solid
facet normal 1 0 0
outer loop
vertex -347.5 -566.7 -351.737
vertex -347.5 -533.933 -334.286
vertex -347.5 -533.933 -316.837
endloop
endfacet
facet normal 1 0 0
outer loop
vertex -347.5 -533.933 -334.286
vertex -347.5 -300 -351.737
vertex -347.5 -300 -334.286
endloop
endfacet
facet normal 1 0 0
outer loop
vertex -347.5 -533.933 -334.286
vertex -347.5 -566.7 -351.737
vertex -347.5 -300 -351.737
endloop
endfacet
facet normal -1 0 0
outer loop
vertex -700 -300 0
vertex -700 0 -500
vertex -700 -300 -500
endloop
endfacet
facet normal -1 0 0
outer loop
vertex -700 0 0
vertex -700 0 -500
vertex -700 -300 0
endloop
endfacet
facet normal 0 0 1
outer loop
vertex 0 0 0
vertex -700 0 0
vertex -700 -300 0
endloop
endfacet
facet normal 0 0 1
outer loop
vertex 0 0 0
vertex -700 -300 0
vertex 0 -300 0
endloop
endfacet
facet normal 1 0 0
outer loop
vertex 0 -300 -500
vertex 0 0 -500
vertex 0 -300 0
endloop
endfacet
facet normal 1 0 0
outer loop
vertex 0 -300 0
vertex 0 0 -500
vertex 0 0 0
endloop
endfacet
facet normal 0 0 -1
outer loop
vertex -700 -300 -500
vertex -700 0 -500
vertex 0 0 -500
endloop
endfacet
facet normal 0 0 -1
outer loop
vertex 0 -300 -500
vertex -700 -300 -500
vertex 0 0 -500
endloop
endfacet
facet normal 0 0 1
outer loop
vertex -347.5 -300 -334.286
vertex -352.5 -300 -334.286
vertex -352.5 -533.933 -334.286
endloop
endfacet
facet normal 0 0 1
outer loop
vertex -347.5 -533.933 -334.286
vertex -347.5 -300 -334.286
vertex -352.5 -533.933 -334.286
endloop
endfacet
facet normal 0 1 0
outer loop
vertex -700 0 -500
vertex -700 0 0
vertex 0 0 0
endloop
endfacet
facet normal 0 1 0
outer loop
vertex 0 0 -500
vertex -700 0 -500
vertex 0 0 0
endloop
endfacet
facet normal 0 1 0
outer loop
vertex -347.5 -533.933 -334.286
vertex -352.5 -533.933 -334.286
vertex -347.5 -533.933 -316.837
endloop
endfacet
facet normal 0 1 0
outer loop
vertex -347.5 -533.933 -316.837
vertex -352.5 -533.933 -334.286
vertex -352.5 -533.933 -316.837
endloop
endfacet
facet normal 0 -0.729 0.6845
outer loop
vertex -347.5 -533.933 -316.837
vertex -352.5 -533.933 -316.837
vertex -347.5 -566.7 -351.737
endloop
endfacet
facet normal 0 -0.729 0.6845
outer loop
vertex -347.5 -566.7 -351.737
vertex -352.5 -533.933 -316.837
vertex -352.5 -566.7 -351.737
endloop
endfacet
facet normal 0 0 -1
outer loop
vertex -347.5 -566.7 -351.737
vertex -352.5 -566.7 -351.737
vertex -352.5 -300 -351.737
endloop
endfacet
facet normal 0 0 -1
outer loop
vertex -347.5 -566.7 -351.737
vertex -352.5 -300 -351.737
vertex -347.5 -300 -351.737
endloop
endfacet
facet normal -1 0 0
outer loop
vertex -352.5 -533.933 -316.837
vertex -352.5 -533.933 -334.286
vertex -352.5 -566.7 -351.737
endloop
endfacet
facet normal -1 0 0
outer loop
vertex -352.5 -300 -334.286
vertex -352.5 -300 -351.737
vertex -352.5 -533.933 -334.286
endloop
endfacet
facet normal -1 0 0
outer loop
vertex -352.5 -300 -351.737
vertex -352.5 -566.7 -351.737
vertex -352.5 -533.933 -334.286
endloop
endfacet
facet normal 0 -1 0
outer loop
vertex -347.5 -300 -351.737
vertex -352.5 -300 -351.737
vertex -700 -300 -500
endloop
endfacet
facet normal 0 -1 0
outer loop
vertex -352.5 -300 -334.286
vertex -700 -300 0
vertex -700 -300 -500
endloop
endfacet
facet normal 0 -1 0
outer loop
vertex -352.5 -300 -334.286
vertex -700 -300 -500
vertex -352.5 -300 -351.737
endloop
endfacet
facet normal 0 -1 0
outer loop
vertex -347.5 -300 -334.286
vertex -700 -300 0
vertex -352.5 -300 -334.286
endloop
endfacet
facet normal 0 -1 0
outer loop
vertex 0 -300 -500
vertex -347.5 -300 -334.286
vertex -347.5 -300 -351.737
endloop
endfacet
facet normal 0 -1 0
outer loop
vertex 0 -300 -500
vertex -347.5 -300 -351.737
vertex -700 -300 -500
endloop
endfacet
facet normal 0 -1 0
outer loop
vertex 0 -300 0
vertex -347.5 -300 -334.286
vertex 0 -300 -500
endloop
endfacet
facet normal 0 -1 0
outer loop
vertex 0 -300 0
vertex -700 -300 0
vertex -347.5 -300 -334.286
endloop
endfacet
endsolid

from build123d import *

# Parameters (mm, degrees)
F0_W     = 700
F0_H     = 500
F1_DEPTH = 300
F2_W     = 5
F2_H     = 34.9
F3_DEPTH = 266.7
F4_W     = 233.9330434799
F4_H     = 17.4498
F5_DEPTH = 25.4


with BuildPart() as f1:
    # F0 (on Front) → F1 (new body)
    with BuildSketch(Plane.XZ):
        with Locations((-350, -250)):
            Rectangle(F0_W, F0_H)
    extrude(amount=F1_DEPTH)

    # F2 (on face) → F3 (join)
    with BuildSketch(Plane.XZ.offset(300)):
        with Locations((-350, -334.2865335016)):
            Rectangle(F2_W, F2_H)
    extrude(amount=F3_DEPTH)

    # F4 (on face) → F5 (cut)
    with BuildSketch(Plane(origin=(-352.5, 0, 0), x_dir=(0, -1, 0), z_dir=(-1, 0, 0))):
        with Locations((416.96652174, -325.5614335016)):
            Rectangle(F4_W, F4_H)
        Polygon((533.9330434799, -316.8365335016), (566.7, -351.7365335016), (566.7, -316.8365335016), align=None)
    extrude(amount=-F5_DEPTH, mode=Mode.SUBTRACT)


solid = f1.part
